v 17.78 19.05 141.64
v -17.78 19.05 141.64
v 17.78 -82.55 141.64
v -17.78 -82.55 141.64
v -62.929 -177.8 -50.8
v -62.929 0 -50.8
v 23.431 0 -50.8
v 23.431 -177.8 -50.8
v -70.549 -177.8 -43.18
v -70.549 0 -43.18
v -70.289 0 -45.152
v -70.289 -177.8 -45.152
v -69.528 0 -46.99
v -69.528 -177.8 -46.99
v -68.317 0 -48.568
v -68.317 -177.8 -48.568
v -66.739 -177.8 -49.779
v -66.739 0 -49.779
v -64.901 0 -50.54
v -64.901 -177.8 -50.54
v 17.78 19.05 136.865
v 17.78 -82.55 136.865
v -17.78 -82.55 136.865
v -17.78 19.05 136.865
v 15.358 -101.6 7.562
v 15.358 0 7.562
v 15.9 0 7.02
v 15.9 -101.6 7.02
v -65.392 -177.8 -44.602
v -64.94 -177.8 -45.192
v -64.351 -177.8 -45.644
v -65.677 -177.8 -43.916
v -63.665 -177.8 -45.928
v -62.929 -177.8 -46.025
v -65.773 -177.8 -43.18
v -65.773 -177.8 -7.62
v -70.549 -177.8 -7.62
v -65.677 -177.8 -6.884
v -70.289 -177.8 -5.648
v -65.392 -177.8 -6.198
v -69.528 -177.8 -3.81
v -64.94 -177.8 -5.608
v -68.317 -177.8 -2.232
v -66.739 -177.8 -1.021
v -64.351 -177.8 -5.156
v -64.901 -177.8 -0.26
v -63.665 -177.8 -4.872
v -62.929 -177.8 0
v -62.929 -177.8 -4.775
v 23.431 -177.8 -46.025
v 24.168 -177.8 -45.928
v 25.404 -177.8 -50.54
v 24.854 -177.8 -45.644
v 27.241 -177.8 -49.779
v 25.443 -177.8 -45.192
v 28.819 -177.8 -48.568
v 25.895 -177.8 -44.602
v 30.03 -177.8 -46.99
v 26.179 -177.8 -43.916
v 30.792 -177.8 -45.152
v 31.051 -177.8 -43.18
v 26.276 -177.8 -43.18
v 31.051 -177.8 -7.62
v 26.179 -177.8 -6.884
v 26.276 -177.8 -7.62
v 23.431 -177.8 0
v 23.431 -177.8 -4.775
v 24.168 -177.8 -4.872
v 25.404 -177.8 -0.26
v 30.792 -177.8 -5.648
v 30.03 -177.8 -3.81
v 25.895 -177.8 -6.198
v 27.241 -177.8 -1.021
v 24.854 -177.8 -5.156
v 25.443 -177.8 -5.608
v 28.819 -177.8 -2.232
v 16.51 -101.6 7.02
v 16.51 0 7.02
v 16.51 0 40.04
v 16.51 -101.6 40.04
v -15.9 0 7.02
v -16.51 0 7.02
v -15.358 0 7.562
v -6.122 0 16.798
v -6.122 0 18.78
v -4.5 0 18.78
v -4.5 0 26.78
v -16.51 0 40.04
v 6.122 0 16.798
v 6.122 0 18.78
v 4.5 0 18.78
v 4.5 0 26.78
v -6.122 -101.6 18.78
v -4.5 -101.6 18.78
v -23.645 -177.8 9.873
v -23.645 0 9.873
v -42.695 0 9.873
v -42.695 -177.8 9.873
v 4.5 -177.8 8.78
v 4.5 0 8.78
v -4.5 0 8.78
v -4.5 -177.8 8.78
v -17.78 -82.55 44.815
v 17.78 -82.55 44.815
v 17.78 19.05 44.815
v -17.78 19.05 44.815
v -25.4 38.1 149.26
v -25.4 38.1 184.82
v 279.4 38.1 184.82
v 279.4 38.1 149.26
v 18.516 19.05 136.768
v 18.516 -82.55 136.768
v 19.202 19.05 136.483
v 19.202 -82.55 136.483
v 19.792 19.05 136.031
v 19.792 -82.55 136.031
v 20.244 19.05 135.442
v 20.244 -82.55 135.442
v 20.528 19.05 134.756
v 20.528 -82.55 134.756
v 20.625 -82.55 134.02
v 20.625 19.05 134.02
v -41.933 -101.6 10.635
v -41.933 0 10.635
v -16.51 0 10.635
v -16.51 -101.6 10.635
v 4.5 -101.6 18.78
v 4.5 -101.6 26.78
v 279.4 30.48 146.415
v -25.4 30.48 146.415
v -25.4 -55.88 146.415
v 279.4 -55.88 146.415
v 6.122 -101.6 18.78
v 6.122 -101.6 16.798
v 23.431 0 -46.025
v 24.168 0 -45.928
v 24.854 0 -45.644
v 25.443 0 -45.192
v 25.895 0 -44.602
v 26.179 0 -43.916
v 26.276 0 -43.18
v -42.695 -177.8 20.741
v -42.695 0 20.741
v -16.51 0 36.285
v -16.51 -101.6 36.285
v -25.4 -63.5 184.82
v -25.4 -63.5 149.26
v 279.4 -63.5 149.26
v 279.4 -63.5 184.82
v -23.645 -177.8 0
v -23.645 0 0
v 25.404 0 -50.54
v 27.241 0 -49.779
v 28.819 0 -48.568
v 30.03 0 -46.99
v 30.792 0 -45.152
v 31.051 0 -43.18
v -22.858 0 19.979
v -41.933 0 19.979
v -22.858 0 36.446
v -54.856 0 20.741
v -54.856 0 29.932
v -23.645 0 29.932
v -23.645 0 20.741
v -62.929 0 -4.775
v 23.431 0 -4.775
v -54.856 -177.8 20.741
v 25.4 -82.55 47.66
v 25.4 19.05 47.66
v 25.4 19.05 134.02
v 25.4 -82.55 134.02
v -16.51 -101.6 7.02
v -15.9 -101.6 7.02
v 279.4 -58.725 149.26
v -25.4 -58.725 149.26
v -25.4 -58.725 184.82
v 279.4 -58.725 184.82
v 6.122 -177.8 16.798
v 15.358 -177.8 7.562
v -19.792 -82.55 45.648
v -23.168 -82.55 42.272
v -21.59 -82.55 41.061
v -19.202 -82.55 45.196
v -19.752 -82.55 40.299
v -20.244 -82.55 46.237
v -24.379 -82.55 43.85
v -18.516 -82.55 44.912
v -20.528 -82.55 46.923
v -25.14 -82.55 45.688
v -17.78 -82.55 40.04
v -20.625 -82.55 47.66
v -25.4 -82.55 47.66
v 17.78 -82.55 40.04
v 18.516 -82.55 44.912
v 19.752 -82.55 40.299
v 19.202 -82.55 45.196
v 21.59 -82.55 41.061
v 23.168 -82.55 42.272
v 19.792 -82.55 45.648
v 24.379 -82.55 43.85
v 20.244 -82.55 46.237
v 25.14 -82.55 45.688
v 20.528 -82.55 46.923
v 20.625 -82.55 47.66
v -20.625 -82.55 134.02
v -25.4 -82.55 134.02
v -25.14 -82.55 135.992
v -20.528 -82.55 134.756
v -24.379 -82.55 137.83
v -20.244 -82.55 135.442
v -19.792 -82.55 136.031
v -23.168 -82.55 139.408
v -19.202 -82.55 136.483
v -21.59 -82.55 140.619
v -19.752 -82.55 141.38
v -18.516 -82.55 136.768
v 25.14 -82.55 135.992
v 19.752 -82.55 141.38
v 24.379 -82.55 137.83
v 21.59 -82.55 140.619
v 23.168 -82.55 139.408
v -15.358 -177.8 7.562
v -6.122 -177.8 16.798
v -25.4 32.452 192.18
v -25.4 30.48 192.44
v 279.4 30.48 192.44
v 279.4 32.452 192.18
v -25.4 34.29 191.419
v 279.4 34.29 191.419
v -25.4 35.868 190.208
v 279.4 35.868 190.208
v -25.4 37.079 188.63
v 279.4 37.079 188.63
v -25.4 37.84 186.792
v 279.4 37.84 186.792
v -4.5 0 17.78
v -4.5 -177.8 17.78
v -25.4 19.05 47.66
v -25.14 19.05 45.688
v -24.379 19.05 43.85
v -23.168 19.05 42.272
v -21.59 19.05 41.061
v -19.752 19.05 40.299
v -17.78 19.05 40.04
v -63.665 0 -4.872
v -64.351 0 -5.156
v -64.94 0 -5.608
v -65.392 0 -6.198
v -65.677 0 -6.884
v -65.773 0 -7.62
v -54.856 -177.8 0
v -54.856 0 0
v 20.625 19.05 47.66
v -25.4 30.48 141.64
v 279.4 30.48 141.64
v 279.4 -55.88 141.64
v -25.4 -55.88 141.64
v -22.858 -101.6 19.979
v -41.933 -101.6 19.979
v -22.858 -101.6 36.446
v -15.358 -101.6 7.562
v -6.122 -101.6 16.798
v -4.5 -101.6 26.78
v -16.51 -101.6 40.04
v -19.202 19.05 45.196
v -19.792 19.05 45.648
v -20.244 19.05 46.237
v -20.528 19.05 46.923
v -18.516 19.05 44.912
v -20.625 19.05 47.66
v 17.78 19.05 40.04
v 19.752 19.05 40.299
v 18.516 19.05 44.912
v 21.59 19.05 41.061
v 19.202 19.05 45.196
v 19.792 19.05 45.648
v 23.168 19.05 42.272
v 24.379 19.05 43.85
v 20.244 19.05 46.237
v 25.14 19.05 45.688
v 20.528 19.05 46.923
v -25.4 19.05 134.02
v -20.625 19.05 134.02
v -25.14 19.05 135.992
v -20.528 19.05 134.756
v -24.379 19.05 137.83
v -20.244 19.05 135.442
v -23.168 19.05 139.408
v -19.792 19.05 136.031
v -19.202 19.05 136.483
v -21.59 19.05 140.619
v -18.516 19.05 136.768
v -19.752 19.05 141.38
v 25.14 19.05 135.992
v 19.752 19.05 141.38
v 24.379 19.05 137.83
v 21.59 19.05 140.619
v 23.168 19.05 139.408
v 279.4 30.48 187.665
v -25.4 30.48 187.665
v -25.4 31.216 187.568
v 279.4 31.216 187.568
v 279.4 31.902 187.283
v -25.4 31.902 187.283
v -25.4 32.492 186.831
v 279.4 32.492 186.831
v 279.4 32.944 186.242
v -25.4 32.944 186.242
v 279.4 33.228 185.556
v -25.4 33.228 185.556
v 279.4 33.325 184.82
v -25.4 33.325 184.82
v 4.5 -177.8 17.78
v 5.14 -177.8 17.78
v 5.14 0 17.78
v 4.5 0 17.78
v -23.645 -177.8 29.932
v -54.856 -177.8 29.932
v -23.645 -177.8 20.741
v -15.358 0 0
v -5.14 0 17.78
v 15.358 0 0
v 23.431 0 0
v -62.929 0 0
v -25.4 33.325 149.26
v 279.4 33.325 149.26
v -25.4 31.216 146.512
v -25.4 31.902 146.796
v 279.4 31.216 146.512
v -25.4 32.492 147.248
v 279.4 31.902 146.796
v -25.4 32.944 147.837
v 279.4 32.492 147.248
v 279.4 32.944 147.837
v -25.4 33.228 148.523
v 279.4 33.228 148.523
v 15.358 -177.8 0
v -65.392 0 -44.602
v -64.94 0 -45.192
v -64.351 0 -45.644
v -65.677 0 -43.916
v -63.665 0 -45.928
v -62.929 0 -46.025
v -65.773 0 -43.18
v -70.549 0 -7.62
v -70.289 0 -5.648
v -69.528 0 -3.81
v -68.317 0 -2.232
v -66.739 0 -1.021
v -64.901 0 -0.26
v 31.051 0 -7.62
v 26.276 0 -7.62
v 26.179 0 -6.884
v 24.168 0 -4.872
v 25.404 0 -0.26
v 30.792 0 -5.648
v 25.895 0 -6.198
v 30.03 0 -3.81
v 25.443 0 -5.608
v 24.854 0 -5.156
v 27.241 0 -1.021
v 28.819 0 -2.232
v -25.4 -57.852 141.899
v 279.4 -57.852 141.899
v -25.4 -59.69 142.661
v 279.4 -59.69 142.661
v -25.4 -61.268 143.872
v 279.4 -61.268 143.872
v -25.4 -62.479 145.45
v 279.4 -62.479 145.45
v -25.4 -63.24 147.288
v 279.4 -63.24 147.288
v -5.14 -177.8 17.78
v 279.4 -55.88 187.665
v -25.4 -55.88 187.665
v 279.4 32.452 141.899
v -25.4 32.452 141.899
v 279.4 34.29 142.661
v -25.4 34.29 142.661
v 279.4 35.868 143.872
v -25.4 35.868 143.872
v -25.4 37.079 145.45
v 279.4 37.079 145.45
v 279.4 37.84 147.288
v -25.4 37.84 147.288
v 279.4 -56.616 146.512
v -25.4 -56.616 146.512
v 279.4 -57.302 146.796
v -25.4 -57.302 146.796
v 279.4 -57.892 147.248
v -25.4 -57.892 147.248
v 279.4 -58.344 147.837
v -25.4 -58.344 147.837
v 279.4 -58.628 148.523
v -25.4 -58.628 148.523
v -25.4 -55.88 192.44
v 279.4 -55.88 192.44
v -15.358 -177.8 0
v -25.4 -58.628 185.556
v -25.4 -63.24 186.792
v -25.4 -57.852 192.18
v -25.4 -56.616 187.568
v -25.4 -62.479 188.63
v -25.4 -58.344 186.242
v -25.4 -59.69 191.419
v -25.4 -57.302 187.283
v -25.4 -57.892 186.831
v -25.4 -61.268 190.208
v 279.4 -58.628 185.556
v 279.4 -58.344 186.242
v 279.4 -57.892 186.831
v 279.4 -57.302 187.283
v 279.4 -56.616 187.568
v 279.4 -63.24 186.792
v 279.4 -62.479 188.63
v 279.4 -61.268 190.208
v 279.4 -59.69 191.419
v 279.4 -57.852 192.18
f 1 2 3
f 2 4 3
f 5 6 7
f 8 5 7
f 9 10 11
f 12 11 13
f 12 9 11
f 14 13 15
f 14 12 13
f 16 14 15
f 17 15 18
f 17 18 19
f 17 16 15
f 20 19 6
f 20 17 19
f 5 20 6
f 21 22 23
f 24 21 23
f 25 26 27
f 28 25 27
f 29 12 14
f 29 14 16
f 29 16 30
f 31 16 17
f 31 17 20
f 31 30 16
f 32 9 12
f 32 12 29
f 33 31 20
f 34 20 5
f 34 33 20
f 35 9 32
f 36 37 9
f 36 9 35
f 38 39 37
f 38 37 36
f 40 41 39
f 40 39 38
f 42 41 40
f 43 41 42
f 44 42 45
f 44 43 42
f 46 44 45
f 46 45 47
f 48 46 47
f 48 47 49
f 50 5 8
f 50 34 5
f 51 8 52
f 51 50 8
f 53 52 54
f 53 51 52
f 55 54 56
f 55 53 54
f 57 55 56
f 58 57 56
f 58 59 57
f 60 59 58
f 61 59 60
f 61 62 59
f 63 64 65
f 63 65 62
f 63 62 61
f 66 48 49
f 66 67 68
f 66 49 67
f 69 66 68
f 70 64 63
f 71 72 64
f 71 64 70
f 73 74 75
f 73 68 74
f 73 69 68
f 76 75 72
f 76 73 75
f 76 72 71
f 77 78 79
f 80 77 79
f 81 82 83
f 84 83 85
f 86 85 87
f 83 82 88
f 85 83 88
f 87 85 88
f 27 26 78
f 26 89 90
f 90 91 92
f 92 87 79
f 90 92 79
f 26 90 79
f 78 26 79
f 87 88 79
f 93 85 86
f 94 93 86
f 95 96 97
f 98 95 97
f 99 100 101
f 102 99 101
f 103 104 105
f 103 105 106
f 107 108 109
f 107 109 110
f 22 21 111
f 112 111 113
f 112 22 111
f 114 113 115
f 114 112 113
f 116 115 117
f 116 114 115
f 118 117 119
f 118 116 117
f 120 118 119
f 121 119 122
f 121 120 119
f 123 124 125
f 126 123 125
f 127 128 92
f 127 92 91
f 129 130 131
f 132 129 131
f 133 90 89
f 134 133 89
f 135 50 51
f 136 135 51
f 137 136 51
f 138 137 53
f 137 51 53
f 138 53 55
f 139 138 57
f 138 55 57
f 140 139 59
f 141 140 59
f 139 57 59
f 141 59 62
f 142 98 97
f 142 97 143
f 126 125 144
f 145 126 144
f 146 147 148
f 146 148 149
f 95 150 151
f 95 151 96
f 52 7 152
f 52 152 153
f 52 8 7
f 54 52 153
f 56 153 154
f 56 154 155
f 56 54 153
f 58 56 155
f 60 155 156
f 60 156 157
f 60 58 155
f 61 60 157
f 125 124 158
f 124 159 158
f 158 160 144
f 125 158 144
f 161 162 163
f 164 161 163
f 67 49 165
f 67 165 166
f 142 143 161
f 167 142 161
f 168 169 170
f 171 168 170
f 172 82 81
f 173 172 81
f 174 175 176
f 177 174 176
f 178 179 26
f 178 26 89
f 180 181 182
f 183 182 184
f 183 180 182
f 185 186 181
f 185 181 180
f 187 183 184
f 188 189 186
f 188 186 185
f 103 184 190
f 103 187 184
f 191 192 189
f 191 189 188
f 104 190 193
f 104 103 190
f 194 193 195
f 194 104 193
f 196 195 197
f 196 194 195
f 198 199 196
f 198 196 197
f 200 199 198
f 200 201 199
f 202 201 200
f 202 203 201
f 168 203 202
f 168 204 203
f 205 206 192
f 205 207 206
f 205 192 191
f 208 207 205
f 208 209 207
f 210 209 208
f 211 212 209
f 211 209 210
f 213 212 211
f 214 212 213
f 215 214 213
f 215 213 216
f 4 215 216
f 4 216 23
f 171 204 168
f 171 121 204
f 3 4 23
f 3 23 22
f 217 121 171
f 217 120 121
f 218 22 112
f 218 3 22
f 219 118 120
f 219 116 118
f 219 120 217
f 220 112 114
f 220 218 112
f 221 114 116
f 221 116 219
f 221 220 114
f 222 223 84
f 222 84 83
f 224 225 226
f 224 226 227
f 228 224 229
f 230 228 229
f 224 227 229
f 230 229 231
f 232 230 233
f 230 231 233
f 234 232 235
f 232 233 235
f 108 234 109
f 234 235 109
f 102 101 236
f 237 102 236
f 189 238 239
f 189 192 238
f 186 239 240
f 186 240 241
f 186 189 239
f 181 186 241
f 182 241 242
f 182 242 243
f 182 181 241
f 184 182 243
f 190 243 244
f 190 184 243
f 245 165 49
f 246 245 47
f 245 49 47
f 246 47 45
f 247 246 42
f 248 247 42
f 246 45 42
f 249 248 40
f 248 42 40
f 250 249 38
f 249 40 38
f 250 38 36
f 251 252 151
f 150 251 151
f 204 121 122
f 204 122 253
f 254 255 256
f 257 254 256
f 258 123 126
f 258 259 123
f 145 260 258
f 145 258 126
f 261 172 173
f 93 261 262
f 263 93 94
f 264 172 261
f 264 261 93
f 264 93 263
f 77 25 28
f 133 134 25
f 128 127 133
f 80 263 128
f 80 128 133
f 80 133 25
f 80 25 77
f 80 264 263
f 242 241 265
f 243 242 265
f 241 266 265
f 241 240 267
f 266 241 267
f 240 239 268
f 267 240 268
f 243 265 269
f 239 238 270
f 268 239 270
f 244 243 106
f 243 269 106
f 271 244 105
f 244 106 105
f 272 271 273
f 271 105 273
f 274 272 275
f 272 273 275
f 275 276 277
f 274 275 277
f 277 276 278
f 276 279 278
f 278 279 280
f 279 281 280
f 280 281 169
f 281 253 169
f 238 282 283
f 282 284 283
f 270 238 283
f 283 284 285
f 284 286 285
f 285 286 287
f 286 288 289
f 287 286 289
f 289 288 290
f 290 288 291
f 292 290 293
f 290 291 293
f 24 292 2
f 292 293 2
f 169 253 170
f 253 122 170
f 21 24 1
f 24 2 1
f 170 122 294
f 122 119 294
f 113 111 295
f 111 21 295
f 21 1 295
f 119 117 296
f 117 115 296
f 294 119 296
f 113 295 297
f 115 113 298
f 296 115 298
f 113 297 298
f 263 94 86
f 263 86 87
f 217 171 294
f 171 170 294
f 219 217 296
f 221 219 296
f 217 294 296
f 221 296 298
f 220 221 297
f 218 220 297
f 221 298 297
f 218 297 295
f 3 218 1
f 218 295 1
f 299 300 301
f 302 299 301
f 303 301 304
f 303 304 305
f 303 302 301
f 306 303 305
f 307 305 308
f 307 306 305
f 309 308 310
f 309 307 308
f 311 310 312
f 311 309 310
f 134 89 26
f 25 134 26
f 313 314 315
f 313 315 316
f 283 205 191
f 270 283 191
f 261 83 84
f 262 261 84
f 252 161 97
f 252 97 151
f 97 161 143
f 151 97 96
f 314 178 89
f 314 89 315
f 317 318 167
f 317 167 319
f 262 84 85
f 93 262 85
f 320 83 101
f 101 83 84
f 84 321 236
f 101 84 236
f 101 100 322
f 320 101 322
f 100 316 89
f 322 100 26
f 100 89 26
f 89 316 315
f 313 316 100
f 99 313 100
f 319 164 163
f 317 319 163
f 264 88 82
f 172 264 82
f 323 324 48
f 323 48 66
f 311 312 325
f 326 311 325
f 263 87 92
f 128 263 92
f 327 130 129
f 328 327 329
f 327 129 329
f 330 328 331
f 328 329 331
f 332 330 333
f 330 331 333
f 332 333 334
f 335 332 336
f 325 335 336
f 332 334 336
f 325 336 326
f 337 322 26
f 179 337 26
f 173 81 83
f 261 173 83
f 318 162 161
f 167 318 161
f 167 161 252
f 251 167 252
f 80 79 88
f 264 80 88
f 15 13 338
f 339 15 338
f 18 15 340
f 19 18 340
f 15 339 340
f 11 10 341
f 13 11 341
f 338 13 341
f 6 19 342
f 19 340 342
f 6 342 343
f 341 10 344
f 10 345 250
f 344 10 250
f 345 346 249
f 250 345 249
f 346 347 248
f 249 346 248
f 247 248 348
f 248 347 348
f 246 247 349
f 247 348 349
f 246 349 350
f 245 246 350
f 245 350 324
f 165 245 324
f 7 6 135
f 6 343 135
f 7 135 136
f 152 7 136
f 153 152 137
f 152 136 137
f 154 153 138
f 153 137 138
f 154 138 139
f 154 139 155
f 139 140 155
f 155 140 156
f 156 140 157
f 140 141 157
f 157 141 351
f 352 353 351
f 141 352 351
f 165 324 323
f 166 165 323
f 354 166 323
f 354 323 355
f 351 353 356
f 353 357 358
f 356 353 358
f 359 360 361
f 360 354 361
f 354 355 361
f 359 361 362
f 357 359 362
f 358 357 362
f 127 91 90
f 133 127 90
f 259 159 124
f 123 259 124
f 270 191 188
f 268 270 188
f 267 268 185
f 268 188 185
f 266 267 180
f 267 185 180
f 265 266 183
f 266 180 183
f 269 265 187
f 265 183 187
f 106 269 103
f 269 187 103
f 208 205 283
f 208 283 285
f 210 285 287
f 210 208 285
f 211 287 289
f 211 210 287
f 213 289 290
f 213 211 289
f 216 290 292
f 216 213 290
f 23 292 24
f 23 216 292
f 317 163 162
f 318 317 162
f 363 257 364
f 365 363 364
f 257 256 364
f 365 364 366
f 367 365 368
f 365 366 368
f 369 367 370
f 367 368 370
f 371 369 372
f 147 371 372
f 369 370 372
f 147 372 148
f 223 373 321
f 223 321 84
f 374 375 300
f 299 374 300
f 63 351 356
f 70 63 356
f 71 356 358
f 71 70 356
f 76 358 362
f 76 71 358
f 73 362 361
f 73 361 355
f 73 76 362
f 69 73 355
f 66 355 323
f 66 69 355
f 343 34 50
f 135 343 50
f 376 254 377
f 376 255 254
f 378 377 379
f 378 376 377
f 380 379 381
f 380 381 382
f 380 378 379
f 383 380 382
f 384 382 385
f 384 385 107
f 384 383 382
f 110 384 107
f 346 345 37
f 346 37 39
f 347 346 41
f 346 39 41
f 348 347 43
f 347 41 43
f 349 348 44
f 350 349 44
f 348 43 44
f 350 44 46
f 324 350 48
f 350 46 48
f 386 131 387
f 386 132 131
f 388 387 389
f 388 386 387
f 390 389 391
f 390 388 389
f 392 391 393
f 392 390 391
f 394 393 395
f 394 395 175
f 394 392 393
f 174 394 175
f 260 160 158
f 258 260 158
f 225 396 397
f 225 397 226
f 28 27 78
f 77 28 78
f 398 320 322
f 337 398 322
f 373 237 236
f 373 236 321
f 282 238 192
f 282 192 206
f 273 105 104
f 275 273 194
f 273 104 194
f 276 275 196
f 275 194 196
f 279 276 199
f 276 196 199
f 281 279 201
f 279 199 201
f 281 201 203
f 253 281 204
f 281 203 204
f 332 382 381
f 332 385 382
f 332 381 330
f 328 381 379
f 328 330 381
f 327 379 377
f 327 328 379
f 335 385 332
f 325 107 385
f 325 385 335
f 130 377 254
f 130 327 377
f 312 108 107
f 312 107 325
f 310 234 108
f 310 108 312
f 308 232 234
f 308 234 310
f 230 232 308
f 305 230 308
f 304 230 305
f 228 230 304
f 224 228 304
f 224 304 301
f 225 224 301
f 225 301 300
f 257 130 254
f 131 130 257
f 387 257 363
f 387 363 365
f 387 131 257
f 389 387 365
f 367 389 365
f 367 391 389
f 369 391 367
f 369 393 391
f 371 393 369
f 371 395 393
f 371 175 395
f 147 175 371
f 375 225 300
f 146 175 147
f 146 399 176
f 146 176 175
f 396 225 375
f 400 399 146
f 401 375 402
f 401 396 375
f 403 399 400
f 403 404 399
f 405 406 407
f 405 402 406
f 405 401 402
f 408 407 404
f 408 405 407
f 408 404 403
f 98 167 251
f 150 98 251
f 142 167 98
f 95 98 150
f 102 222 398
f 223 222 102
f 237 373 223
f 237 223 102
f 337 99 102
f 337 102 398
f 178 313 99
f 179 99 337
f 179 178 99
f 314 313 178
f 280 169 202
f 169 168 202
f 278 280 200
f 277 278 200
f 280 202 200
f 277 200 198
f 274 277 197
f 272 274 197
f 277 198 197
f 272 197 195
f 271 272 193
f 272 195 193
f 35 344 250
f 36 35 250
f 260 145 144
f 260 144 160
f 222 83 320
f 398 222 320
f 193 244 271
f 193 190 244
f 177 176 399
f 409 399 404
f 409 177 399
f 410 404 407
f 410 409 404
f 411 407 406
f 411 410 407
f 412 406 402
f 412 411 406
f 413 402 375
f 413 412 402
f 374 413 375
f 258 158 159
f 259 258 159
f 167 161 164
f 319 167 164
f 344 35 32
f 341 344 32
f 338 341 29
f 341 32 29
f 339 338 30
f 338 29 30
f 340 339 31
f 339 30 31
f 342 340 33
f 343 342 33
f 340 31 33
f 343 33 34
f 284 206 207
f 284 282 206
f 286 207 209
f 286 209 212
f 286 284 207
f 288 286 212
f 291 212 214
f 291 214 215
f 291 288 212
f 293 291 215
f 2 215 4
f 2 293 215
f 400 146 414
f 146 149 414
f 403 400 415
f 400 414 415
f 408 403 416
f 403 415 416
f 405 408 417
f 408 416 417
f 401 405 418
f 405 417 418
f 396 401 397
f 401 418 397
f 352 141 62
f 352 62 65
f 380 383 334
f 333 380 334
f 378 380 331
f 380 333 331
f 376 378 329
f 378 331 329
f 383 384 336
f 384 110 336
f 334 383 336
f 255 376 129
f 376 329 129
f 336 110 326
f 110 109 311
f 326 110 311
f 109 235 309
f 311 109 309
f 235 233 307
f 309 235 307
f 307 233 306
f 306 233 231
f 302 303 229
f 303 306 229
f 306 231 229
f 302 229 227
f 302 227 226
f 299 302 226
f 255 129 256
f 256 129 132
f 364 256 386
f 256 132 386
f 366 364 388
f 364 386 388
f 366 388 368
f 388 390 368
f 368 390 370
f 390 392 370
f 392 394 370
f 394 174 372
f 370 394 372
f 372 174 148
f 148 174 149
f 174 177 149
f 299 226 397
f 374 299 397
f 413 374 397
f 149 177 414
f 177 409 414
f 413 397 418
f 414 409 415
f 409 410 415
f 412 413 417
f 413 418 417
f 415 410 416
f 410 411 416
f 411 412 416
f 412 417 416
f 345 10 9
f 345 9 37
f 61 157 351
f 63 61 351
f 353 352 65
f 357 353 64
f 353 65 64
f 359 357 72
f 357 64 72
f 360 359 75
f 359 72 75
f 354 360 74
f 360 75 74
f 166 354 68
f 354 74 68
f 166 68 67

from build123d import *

# Parameters (mm, degrees)
F1_DEPTH       = 177.8
F2_DEPTH       = 101.6
F4_DEPTH       = 101.6
F5_DEPTH       = 177.8
F6_DEPTH       = 177.8
F7_W           = 101.6
F7_H           = 50.8
F8_DEPTH       = 177.8
F9_R           = 7.62
F10_T          = -4.7752
F11_DEPTH      = 25.4
F12_W          = 50.8
F12_H          = 101.6
F13_DEPTH      = 82.55
F13_DEPTH_BACK = 19.05
F14_R          = 7.62
F15_T          = -4.7752
F16_DEPTH      = 25.4
F18_DEPTH      = 304.8
F19_R          = 7.62
F20_T          = -4.7752
F21_DEPTH      = 25.4


with BuildPart() as f1:
    # F0 (on Front) → F1 (new body)
    with BuildSketch(Plane.XZ):
        Polygon((-15.3582496569, 0), (0, 0), (15.3582496569, 0), (15.3582496569, 7.5618312694), (6.1221620999, 16.7979188263), (5.1400809263, 17.78), (4.5, 17.78), (4.5, 8.78), (0, 8.78), (-4.5, 8.78), (-4.5, 17.78), (-5.1400809263, 17.78), (-6.1221620999, 16.7979188263), (-15.3582496569, 7.5618312694), align=None)
    extrude(amount=F1_DEPTH)


with BuildPart() as f2:
    # F0 (on Front) → F2 (new body)
    with BuildSketch(Plane.XZ):
        Polygon((6.1221620999, 16.7979188263), (15.3582496569, 7.5618312694), (15.9003665005, 7.0197144258), (16.51, 7.0197144258), (16.51, 40.0397144258), (0, 40.0397144258), (-16.51, 40.0397144258), (-16.51, 7.0197144258), (-15.9003665005, 7.0197144258), (-15.3582496569, 7.5618312694), (-6.1221620999, 16.7979188263), (-6.1221620999, 18.78), (-4.5, 18.78), (-4.5, 26.78), (0, 26.78), (4.5, 26.78), (4.5, 18.78), (6.1221620999, 18.78), align=None)
    extrude(amount=F2_DEPTH)


with BuildPart() as f4:
    # F3 (on Front) → F4 (new body, through all)
    with BuildSketch(Plane.XZ):
        Polygon((-41.9327285861, 10.634648865), (-16.51, 10.634648865), (-16.51, 36.2853350896), (-22.8579633763, 36.446148563), (-22.8579633763, 19.978956068), (-41.9327285861, 19.978956068), align=None)
    extrude(amount=F4_DEPTH)


with BuildPart() as f5:
    # F3 (on Front) → F5 (new body, through all)
    with BuildSketch(Plane.XZ):
        Polygon((-54.8555701971, 29.9320984632), (-54.8555701971, 20.740956068), (-42.6947285861, 20.740956068), (-23.6447285861, 20.740956068), (-23.6447285861, 29.9320984632), align=None)
    extrude(amount=F5_DEPTH)


with BuildPart() as f6:
    # F3 (on Front) → F6 (new body, through all)
    with BuildSketch(Plane.XZ):
        Polygon((-54.8555701971, 0), (-23.6447285861, 0), (-23.6447285861, 4.6855933033), (-23.6447285861, 7.5618312694), (-23.6447285861, 9.872648865), (-42.6947285861, 9.872648865), (-42.6947285861, 20.740956068), (-54.8555701971, 20.740956068), align=None)
    extrude(amount=F6_DEPTH)


with BuildPart() as f8:
    # F7 (on Front) → F8 (new body, through all)
    with BuildSketch(Plane.XZ):
        with Locations((-19.7486602701, -25.4)):
            Rectangle(F7_W, F7_H)
    extrude(amount=F8_DEPTH)

    # F9
    f9_edges = [f8.edges().sort_by_distance(p)[0] for p in [
        (-70.54866, -88.9, 0),
        (31.05134, -88.9, 0),
        (-70.54866, -88.9, -50.8),
        (31.05134, -88.9, -50.8),
    ]]
    fillet(f9_edges, radius=F9_R)

    # F10
    f10_openings = [f8.faces().sort_by_distance(p)[0] for p in [
        (-19.74866, -177.8, -25.4),
    ]]
    offset(amount=F10_T, openings=f10_openings)

    # F11 (cut): a face of the model
    f11_faces = [f8.faces().sort_by_distance(p)[0] for p in [
        (-19.7486602701, -4.7752, -25.4),
    ]]
    extrude(f11_faces, amount=-F11_DEPTH, mode=Mode.SUBTRACT)


with BuildPart() as f13:
    # F12 (on Front) → F13 (new body, two sides)
    with BuildSketch(Plane.XZ) as f13_sk:
        with Locations((0, 90.8397144258)):
            Rectangle(F12_W, F12_H)
    extrude(amount=F13_DEPTH)
    extrude(f13_sk.sketch, amount=-F13_DEPTH_BACK)

    # F14
    f14_edges = [f13.edges().sort_by_distance(p)[0] for p in [
        (25.4, -31.75, 141.639714),
        (25.4, -31.75, 40.039714),
        (-25.4, -31.75, 40.039714),
        (-25.4, -31.75, 141.639714),
    ]]
    fillet(f14_edges, radius=F14_R)

    # F15
    f15_openings = [f13.faces().sort_by_distance(p)[0] for p in [
        (0, -82.55, 90.839714),
    ]]
    offset(amount=F15_T, openings=f15_openings)

    # F16 (cut): a face of the model
    f16_faces = [f13.faces().sort_by_distance(p)[0] for p in [
        (0, 14.2748, 90.8397144258),
    ]]
    extrude(f16_faces, amount=-F16_DEPTH, mode=Mode.SUBTRACT)


with BuildPart() as f18:
    # F17 (on face) → F18 (new body)
    with BuildSketch(Plane(origin=(-25.4, 0, 0), x_dir=(0, -1, 0), z_dir=(-1, 0, 0))):
        Polygon((-38.1, 141.6397144258), (-19.05, 141.6397144258), (63.5, 141.6397144258), (63.5, 192.4397144258), (-38.1, 192.4397144258), align=None)
    extrude(amount=-F18_DEPTH)

    # F19
    f19_edges = [f18.edges().sort_by_distance(p)[0] for p in [
        (127, 38.1, 141.639714),
        (127, -63.5, 141.639714),
        (127, -63.5, 192.439714),
        (127, 38.1, 192.439714),
    ]]
    fillet(f19_edges, radius=F19_R)

    # F20
    f20_openings = [f18.faces().sort_by_distance(p)[0] for p in [
        (-25.4, -12.7, 167.039714),
    ]]
    offset(amount=F20_T, openings=f20_openings)

    # F21 (cut): a face of the model
    f21_faces = [f18.faces().sort_by_distance(p)[0] for p in [
        (274.6248, -12.7, 167.0397144258),
    ]]
    extrude(f21_faces, amount=-F21_DEPTH, mode=Mode.SUBTRACT)


solid = Compound([f1.part, f2.part, f4.part, f5.part, f6.part, f8.part, f13.part, f18.part])
